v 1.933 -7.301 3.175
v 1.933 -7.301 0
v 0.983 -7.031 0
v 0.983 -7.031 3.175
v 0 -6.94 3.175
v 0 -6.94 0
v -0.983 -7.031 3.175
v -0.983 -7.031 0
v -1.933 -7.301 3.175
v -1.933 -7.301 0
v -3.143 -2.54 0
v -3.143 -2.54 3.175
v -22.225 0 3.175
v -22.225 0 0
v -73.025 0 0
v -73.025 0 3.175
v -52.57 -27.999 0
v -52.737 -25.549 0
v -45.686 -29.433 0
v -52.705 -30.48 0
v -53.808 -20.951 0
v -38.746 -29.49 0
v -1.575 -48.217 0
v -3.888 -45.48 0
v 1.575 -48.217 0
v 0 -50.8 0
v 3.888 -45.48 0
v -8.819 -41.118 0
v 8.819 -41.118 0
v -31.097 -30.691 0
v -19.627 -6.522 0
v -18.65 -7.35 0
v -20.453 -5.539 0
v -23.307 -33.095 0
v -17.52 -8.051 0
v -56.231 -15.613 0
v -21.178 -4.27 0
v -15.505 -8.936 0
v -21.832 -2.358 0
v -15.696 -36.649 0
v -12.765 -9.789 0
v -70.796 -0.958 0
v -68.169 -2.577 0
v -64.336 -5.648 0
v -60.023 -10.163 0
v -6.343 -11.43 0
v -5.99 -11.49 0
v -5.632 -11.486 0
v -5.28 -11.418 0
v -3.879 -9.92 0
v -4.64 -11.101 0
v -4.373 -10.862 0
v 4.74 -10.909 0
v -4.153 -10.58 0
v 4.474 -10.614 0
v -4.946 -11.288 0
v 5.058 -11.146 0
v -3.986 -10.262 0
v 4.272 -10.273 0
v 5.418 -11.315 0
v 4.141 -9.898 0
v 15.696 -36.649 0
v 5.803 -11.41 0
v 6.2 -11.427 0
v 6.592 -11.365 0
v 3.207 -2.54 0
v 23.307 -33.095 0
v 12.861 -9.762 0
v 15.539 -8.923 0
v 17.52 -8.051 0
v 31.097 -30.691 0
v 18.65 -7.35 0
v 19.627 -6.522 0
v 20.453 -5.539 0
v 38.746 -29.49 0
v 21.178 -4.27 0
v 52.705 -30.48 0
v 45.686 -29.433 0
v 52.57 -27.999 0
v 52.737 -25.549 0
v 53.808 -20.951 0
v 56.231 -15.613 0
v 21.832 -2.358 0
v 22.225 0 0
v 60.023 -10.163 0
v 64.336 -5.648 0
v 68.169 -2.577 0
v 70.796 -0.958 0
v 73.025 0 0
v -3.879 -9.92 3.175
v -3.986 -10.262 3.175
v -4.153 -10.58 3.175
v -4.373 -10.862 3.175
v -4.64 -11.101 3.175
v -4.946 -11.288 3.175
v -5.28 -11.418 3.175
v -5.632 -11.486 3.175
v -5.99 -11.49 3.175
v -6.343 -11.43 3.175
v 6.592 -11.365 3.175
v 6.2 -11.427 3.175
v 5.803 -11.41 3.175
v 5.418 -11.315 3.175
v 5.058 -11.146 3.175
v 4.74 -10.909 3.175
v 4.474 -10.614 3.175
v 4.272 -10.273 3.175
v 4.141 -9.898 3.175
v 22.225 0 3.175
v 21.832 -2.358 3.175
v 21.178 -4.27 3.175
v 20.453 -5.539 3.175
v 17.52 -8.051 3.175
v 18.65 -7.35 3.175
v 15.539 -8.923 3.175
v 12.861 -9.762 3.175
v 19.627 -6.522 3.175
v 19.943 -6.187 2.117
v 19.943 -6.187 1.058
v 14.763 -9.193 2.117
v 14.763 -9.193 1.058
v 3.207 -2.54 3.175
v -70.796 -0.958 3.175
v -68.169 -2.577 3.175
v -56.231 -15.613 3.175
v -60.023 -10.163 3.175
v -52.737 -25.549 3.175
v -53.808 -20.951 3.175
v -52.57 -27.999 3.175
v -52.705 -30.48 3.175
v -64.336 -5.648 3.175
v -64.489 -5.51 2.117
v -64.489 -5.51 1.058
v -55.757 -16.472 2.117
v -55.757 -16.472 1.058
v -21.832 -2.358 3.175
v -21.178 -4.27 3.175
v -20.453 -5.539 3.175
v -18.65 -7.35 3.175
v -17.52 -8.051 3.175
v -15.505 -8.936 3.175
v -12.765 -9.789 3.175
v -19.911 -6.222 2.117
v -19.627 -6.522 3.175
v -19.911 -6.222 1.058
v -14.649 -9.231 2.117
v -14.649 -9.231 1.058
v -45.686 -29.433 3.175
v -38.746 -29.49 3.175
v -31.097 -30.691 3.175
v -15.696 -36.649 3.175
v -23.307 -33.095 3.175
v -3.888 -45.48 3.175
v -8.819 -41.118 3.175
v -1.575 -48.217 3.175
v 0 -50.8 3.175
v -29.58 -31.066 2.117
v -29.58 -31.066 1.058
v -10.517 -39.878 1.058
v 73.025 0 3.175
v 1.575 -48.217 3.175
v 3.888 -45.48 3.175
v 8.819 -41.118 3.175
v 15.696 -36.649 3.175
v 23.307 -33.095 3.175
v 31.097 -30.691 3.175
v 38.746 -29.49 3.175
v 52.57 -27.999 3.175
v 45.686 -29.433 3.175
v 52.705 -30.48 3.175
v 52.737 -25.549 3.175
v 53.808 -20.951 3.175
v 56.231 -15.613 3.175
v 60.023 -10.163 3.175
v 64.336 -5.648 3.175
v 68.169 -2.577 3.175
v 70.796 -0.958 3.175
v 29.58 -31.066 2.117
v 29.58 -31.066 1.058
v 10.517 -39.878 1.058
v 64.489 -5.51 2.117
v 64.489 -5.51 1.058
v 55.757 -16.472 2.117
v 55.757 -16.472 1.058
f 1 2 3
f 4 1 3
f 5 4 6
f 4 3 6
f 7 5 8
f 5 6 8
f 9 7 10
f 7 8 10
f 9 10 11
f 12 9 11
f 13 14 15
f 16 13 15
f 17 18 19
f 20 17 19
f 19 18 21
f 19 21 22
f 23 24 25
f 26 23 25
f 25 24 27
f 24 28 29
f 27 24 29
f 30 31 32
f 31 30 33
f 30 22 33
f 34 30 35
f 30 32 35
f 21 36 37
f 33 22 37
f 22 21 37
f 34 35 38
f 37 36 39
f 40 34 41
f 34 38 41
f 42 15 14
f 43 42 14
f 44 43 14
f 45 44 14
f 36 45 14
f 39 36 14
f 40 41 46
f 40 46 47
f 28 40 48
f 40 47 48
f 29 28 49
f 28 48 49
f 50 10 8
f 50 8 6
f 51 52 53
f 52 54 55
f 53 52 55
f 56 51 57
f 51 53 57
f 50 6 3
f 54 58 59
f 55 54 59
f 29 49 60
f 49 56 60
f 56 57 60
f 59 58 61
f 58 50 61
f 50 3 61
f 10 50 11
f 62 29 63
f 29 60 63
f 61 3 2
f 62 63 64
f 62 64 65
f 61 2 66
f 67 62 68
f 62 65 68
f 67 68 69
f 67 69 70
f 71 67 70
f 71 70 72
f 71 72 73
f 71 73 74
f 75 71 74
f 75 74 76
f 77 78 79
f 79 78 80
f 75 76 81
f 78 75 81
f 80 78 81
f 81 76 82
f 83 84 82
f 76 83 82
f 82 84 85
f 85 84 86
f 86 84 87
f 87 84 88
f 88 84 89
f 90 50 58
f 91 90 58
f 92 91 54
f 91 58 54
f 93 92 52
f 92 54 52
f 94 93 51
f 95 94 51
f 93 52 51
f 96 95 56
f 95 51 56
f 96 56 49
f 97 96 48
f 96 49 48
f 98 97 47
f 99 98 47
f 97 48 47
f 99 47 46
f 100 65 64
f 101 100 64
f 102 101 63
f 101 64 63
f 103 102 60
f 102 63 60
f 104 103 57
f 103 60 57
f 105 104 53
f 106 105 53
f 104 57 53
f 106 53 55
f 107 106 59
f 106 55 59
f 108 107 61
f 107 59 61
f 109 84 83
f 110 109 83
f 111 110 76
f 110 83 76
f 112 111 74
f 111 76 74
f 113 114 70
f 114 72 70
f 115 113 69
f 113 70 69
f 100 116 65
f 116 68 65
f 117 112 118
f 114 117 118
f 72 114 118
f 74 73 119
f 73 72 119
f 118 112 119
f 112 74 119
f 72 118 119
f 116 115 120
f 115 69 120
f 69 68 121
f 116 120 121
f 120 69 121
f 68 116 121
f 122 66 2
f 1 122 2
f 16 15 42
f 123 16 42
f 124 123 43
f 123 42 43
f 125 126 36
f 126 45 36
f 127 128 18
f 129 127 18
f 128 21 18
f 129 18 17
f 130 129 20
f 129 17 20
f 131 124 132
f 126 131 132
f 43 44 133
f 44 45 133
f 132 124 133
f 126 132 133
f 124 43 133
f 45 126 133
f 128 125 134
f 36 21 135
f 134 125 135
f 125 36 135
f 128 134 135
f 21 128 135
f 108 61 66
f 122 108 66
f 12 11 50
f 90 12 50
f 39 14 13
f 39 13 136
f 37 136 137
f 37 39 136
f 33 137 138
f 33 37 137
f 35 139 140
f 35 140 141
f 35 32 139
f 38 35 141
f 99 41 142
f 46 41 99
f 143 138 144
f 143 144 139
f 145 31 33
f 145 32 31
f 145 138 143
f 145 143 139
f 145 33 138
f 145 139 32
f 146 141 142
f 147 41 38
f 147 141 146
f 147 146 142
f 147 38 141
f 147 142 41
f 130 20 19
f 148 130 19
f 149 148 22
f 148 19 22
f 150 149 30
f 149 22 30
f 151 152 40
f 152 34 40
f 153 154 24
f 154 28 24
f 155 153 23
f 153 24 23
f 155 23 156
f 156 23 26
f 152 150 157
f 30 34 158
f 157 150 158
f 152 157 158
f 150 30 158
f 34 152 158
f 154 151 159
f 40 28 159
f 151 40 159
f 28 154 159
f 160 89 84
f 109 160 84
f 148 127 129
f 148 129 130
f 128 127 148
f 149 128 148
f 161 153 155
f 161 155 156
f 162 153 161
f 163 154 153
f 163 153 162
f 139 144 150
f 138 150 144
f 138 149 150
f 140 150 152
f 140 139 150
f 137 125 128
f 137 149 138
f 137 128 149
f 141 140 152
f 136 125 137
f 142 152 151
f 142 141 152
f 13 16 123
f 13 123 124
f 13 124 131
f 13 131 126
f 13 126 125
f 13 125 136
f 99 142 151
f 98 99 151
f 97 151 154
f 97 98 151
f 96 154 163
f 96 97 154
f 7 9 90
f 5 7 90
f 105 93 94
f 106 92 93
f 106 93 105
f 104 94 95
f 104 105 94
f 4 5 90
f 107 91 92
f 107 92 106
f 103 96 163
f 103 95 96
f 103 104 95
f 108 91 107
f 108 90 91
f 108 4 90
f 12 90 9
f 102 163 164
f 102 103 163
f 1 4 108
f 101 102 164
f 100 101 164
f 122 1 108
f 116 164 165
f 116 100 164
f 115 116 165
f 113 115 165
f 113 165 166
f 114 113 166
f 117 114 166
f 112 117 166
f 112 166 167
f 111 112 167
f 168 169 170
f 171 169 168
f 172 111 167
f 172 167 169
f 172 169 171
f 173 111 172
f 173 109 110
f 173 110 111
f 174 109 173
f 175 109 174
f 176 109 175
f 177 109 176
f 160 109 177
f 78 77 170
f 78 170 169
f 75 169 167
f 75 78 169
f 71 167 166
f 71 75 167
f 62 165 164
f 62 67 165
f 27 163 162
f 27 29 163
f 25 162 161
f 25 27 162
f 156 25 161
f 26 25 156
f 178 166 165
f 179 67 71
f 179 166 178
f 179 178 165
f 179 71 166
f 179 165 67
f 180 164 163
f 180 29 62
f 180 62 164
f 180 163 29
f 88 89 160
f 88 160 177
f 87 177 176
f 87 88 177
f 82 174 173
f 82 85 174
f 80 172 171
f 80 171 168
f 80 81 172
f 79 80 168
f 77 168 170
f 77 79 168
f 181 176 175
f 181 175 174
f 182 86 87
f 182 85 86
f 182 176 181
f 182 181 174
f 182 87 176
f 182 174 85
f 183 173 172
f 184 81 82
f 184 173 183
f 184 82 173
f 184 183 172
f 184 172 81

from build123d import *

# Parameters (mm, degrees)
F1_DEPTH = 3.175


with BuildPart() as f1:
    # F0 (on Top) → F1 (new body)
    with BuildSketch(Plane.XY):
        with BuildLine():
            Line((-22.225, 0), (-73.025, 0))
            add(Edge.make_bspline(
                [(-73.025, 0), (-66.544966, -1.983276), (-50.957656, -15.749979), (-52.705, -30.48)],
                knots=[0, 0, 0, 0, 36.632401, 36.632401, 36.632401, 36.632401], degree=3))
            add(Edge.make_bspline(
                [(-52.705, -30.48), (-29.043146, -24.914946), (-4.748764, -40.86059), (0, -50.8)],
                knots=[0, 0, 0, 0, 56.486453, 56.486453, 56.486453, 56.486453], degree=3))
            add(Edge.make_bspline(
                [(52.705, -30.48), (29.043146, -24.914946), (4.748764, -40.86059), (0, -50.8)],
                knots=[0, 0, 0, 0, 56.486453, 56.486453, 56.486453, 56.486453], degree=3))
            add(Edge.make_bspline(
                [(73.025, 0), (66.544966, -1.983276), (50.957656, -15.749979), (52.705, -30.48)],
                knots=[0, 0, 0, 0, 36.632401, 36.632401, 36.632401, 36.632401], degree=3))
            Line((73.025, 0), (22.225, 0))
            add(Edge.make_bspline(
                [(22.225, 0), (21.361192, -8.558341), (16.288532, -8.829113), (6.591726, -11.364783)],
                knots=[0, 0, 0, 0, 20.034352, 20.034352, 20.034352, 20.034352], degree=3))
            ThreePointArc((6.591726, -11.364783), (5.058404, -11.145817), (4.141238, -9.897687))
            Line((4.141238, -9.897687), (3.206694, -2.54))
            Line((3.206694, -2.54), (1.932969, -7.300782))
            ThreePointArc((1.932969, -7.300782), (0, -6.940186), (-1.932969, -7.300782))
            Line((-1.932969, -7.300782), (-3.143306, -2.54))
            Line((-3.143306, -2.54), (-3.879292, -9.920193))
            ThreePointArc((-3.879292, -9.920193), (-4.788833, -11.20128), (-6.343227, -11.43))
            add(Edge.make_bspline(
                [(-22.225, 0), (-21.353843, -8.631154), (-16.201913, -8.83312), (-6.343227, -11.43)],
                knots=[0, 0, 0, 0, 20.2048, 20.2048, 20.2048, 20.2048], degree=3))
        make_face()
    extrude(amount=F1_DEPTH)


solid = f1.part
